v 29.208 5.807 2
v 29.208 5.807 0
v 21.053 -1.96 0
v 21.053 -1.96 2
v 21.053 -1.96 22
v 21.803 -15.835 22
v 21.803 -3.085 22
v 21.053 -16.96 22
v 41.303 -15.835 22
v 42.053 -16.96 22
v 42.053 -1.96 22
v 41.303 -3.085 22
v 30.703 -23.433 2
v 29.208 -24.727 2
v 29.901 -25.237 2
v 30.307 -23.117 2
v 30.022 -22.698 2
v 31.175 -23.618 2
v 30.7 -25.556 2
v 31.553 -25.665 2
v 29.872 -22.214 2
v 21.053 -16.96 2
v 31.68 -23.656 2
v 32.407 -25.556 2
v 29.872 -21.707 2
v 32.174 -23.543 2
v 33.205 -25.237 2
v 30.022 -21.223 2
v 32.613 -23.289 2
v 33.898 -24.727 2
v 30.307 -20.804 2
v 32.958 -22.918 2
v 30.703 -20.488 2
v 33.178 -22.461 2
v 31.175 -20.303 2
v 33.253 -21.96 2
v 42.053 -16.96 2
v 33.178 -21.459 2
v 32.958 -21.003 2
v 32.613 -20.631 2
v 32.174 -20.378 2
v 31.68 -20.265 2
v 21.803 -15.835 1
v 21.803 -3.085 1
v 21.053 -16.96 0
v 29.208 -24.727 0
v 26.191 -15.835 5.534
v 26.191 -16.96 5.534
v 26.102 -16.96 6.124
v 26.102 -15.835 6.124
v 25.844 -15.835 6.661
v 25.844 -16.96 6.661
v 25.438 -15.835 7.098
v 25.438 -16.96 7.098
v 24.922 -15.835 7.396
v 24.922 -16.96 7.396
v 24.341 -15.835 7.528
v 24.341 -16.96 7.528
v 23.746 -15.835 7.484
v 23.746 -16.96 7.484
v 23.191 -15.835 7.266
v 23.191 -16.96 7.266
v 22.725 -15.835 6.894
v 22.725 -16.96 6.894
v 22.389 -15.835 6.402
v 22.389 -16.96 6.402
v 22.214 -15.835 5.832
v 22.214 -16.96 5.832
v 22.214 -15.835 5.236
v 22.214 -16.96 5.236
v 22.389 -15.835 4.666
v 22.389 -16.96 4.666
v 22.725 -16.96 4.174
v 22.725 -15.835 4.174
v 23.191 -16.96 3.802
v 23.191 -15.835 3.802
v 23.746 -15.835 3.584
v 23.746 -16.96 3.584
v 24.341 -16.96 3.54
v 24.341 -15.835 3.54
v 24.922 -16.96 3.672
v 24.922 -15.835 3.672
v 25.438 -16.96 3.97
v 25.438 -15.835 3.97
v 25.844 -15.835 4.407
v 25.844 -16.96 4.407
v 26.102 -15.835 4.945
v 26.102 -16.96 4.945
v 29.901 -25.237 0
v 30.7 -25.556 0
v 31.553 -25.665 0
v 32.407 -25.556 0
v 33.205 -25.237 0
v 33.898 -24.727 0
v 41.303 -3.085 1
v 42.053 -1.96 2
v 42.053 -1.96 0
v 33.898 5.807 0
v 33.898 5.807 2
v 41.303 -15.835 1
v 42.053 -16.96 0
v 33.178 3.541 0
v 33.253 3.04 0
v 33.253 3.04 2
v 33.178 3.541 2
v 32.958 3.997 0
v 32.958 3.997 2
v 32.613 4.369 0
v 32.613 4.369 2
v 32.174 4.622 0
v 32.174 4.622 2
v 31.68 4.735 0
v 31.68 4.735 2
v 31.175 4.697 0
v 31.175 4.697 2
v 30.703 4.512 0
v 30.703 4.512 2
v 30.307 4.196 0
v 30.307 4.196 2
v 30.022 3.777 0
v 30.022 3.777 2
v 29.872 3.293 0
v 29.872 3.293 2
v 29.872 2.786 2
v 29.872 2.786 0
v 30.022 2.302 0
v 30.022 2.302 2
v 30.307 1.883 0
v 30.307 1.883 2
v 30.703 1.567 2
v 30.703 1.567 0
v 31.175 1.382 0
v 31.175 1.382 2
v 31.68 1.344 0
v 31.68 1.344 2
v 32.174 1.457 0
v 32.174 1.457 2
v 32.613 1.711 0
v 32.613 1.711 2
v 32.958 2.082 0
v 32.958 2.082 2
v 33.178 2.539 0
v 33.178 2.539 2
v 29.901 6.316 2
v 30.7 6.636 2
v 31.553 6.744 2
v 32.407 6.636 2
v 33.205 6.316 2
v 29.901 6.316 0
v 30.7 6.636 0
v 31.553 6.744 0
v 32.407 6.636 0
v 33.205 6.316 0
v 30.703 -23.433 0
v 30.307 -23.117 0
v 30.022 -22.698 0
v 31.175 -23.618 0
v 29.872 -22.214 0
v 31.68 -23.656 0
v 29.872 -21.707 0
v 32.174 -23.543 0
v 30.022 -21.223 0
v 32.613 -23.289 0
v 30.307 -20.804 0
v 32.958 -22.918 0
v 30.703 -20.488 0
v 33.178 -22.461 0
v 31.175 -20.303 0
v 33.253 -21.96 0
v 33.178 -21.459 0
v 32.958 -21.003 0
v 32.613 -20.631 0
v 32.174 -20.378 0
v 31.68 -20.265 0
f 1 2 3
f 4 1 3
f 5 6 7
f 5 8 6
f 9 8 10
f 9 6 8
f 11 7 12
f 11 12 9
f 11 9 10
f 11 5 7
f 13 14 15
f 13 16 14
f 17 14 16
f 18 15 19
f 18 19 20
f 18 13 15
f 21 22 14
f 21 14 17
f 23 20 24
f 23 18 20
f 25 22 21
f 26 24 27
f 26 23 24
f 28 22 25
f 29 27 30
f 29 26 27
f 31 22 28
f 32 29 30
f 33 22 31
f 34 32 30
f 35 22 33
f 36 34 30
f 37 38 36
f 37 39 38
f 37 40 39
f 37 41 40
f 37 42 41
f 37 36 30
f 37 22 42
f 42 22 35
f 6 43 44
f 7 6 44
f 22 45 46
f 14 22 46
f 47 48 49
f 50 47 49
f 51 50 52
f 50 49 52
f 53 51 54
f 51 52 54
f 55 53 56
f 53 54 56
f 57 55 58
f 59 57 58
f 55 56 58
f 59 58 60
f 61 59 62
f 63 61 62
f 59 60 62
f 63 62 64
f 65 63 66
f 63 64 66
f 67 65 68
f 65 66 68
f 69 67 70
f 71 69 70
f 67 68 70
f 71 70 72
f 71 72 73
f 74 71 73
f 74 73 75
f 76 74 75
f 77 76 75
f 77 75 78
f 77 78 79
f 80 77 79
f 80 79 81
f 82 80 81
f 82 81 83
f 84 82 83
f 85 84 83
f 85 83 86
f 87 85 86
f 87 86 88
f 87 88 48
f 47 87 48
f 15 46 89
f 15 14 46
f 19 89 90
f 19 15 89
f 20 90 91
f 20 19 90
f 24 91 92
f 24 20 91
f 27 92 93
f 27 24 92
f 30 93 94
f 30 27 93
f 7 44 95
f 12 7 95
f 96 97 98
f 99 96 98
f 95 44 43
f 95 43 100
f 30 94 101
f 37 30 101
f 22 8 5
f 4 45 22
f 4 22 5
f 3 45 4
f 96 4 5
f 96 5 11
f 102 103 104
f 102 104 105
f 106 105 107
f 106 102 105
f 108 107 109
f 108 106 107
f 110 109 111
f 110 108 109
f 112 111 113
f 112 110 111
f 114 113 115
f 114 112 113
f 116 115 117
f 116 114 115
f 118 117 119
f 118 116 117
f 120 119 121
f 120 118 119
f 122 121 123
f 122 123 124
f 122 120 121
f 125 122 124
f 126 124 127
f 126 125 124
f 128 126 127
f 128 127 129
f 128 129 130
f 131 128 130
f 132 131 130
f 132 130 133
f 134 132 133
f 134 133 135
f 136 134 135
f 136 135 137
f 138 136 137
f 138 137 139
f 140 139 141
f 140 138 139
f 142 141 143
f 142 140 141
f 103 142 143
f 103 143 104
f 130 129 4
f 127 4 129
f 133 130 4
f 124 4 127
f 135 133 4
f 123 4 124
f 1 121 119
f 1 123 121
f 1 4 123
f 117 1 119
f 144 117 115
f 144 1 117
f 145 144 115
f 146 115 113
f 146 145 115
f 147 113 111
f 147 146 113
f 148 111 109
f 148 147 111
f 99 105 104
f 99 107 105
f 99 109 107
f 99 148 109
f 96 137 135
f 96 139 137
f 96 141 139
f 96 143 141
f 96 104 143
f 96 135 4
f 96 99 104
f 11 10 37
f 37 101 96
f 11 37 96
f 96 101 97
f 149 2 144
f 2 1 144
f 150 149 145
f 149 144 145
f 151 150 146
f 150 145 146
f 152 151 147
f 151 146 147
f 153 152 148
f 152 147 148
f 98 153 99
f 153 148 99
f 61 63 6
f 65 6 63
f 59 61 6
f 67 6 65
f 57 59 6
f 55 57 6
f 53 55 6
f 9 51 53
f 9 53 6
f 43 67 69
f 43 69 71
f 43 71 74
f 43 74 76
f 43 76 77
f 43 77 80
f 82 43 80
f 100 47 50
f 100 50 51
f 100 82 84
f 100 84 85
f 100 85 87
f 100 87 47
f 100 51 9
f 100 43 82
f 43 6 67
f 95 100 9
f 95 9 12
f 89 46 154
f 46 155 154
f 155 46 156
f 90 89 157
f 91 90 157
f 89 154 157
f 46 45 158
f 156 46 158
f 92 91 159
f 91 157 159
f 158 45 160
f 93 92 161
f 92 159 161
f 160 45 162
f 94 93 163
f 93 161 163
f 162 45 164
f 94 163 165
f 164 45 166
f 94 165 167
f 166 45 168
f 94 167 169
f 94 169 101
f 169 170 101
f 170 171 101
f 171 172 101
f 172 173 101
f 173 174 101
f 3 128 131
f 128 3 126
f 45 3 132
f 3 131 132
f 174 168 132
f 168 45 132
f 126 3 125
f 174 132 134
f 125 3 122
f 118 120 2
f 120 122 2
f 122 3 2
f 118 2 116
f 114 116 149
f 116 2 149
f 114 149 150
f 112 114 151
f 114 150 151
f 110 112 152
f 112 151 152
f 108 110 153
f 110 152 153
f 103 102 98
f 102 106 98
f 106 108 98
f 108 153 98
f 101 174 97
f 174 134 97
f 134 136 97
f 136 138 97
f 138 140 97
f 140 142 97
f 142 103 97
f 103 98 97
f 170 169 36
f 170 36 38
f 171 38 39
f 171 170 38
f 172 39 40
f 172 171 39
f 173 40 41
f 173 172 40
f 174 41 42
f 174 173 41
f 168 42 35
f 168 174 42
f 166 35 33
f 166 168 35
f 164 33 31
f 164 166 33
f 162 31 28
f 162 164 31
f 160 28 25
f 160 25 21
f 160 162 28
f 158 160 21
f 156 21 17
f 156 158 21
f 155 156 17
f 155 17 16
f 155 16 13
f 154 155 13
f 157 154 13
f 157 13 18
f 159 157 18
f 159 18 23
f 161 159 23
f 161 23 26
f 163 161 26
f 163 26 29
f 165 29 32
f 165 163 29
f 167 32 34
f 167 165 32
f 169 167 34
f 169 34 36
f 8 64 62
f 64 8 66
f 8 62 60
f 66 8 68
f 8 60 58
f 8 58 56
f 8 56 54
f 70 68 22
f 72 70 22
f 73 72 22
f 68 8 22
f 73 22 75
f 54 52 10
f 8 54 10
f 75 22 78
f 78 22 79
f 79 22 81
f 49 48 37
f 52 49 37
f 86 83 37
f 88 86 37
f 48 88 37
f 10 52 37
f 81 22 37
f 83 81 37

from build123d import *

# Parameters (mm, degrees)
F0_W     = 21
F0_H     = 15
F0_W_2   = 19.5
F0_H_2   = 12.75
F1_DEPTH = 22
F2_DEPTH = 1
F0_R     = 1.7
F3_DEPTH = 2
F4_R     = 3.4
F5_R     = 2
F6_DEPTH = 2.5


with BuildPart() as f1:
    # F0 (on Top) → F1 (new body)
    with BuildSketch(Plane.XY):
        with Locations((31.553322, -9.46031)):
            Rectangle(F0_W, F0_H)
        with Locations((31.553322, -9.46031)):
            Rectangle(F0_W_2, F0_H_2, mode=Mode.SUBTRACT)
    extrude(amount=F1_DEPTH)

    # F0 (on Top) → F2 (join)
    with BuildSketch(Plane.XY):
        with Locations((31.553322, -9.46031)):
            Rectangle(F0_W_2, F0_H_2)
    extrude(amount=F2_DEPTH)

    # F0 (on Top) → F3 (join)
    with BuildSketch(Plane.XY):
        Polygon((31.553322, 8.03969), (21.053322, -1.96031), (42.053322, -1.96031), align=None)
        with Locations((31.553322, 3.03969)):
            Circle(F0_R, mode=Mode.SUBTRACT)
        Polygon((42.053322, -16.96031), (21.053322, -16.96031), (31.553322, -26.96031), align=None)
        with Locations((31.553322, -21.96031)):
            Circle(F0_R, mode=Mode.SUBTRACT)
    extrude(amount=F3_DEPTH)

    # F4
    f4_edges = [f1.edges().sort_by_distance(p)[0] for p in [
        (31.553322, 8.03969, 1),
        (31.553322, -26.96031, 1),
    ]]
    fillet(f4_edges, radius=F4_R)

    # F5 (on face) → F6 (cut)
    with BuildSketch(Plane.XZ.offset(16.96031)):
        with Locations((24.191299, 5.534078)):
            Circle(F5_R)
    extrude(amount=-F6_DEPTH, mode=Mode.SUBTRACT)


solid = f1.part
